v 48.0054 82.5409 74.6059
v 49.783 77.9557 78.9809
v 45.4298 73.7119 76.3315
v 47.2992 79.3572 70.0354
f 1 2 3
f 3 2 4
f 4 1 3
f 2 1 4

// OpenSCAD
// Auto-generated auxetic polyhedron
points = [
    [45.429807, 73.711867, 76.331509],
    [49.782979, 77.955653, 78.980854],
    [48.005421, 82.540860, 74.605854],
    [47.299191, 79.357222, 70.035383],
];

faces = [
    [0, 1, 2],
    [3, 1, 0],
    [0, 2, 3],
    [3, 2, 1],
];

polyhedron(points = points, faces = faces);
